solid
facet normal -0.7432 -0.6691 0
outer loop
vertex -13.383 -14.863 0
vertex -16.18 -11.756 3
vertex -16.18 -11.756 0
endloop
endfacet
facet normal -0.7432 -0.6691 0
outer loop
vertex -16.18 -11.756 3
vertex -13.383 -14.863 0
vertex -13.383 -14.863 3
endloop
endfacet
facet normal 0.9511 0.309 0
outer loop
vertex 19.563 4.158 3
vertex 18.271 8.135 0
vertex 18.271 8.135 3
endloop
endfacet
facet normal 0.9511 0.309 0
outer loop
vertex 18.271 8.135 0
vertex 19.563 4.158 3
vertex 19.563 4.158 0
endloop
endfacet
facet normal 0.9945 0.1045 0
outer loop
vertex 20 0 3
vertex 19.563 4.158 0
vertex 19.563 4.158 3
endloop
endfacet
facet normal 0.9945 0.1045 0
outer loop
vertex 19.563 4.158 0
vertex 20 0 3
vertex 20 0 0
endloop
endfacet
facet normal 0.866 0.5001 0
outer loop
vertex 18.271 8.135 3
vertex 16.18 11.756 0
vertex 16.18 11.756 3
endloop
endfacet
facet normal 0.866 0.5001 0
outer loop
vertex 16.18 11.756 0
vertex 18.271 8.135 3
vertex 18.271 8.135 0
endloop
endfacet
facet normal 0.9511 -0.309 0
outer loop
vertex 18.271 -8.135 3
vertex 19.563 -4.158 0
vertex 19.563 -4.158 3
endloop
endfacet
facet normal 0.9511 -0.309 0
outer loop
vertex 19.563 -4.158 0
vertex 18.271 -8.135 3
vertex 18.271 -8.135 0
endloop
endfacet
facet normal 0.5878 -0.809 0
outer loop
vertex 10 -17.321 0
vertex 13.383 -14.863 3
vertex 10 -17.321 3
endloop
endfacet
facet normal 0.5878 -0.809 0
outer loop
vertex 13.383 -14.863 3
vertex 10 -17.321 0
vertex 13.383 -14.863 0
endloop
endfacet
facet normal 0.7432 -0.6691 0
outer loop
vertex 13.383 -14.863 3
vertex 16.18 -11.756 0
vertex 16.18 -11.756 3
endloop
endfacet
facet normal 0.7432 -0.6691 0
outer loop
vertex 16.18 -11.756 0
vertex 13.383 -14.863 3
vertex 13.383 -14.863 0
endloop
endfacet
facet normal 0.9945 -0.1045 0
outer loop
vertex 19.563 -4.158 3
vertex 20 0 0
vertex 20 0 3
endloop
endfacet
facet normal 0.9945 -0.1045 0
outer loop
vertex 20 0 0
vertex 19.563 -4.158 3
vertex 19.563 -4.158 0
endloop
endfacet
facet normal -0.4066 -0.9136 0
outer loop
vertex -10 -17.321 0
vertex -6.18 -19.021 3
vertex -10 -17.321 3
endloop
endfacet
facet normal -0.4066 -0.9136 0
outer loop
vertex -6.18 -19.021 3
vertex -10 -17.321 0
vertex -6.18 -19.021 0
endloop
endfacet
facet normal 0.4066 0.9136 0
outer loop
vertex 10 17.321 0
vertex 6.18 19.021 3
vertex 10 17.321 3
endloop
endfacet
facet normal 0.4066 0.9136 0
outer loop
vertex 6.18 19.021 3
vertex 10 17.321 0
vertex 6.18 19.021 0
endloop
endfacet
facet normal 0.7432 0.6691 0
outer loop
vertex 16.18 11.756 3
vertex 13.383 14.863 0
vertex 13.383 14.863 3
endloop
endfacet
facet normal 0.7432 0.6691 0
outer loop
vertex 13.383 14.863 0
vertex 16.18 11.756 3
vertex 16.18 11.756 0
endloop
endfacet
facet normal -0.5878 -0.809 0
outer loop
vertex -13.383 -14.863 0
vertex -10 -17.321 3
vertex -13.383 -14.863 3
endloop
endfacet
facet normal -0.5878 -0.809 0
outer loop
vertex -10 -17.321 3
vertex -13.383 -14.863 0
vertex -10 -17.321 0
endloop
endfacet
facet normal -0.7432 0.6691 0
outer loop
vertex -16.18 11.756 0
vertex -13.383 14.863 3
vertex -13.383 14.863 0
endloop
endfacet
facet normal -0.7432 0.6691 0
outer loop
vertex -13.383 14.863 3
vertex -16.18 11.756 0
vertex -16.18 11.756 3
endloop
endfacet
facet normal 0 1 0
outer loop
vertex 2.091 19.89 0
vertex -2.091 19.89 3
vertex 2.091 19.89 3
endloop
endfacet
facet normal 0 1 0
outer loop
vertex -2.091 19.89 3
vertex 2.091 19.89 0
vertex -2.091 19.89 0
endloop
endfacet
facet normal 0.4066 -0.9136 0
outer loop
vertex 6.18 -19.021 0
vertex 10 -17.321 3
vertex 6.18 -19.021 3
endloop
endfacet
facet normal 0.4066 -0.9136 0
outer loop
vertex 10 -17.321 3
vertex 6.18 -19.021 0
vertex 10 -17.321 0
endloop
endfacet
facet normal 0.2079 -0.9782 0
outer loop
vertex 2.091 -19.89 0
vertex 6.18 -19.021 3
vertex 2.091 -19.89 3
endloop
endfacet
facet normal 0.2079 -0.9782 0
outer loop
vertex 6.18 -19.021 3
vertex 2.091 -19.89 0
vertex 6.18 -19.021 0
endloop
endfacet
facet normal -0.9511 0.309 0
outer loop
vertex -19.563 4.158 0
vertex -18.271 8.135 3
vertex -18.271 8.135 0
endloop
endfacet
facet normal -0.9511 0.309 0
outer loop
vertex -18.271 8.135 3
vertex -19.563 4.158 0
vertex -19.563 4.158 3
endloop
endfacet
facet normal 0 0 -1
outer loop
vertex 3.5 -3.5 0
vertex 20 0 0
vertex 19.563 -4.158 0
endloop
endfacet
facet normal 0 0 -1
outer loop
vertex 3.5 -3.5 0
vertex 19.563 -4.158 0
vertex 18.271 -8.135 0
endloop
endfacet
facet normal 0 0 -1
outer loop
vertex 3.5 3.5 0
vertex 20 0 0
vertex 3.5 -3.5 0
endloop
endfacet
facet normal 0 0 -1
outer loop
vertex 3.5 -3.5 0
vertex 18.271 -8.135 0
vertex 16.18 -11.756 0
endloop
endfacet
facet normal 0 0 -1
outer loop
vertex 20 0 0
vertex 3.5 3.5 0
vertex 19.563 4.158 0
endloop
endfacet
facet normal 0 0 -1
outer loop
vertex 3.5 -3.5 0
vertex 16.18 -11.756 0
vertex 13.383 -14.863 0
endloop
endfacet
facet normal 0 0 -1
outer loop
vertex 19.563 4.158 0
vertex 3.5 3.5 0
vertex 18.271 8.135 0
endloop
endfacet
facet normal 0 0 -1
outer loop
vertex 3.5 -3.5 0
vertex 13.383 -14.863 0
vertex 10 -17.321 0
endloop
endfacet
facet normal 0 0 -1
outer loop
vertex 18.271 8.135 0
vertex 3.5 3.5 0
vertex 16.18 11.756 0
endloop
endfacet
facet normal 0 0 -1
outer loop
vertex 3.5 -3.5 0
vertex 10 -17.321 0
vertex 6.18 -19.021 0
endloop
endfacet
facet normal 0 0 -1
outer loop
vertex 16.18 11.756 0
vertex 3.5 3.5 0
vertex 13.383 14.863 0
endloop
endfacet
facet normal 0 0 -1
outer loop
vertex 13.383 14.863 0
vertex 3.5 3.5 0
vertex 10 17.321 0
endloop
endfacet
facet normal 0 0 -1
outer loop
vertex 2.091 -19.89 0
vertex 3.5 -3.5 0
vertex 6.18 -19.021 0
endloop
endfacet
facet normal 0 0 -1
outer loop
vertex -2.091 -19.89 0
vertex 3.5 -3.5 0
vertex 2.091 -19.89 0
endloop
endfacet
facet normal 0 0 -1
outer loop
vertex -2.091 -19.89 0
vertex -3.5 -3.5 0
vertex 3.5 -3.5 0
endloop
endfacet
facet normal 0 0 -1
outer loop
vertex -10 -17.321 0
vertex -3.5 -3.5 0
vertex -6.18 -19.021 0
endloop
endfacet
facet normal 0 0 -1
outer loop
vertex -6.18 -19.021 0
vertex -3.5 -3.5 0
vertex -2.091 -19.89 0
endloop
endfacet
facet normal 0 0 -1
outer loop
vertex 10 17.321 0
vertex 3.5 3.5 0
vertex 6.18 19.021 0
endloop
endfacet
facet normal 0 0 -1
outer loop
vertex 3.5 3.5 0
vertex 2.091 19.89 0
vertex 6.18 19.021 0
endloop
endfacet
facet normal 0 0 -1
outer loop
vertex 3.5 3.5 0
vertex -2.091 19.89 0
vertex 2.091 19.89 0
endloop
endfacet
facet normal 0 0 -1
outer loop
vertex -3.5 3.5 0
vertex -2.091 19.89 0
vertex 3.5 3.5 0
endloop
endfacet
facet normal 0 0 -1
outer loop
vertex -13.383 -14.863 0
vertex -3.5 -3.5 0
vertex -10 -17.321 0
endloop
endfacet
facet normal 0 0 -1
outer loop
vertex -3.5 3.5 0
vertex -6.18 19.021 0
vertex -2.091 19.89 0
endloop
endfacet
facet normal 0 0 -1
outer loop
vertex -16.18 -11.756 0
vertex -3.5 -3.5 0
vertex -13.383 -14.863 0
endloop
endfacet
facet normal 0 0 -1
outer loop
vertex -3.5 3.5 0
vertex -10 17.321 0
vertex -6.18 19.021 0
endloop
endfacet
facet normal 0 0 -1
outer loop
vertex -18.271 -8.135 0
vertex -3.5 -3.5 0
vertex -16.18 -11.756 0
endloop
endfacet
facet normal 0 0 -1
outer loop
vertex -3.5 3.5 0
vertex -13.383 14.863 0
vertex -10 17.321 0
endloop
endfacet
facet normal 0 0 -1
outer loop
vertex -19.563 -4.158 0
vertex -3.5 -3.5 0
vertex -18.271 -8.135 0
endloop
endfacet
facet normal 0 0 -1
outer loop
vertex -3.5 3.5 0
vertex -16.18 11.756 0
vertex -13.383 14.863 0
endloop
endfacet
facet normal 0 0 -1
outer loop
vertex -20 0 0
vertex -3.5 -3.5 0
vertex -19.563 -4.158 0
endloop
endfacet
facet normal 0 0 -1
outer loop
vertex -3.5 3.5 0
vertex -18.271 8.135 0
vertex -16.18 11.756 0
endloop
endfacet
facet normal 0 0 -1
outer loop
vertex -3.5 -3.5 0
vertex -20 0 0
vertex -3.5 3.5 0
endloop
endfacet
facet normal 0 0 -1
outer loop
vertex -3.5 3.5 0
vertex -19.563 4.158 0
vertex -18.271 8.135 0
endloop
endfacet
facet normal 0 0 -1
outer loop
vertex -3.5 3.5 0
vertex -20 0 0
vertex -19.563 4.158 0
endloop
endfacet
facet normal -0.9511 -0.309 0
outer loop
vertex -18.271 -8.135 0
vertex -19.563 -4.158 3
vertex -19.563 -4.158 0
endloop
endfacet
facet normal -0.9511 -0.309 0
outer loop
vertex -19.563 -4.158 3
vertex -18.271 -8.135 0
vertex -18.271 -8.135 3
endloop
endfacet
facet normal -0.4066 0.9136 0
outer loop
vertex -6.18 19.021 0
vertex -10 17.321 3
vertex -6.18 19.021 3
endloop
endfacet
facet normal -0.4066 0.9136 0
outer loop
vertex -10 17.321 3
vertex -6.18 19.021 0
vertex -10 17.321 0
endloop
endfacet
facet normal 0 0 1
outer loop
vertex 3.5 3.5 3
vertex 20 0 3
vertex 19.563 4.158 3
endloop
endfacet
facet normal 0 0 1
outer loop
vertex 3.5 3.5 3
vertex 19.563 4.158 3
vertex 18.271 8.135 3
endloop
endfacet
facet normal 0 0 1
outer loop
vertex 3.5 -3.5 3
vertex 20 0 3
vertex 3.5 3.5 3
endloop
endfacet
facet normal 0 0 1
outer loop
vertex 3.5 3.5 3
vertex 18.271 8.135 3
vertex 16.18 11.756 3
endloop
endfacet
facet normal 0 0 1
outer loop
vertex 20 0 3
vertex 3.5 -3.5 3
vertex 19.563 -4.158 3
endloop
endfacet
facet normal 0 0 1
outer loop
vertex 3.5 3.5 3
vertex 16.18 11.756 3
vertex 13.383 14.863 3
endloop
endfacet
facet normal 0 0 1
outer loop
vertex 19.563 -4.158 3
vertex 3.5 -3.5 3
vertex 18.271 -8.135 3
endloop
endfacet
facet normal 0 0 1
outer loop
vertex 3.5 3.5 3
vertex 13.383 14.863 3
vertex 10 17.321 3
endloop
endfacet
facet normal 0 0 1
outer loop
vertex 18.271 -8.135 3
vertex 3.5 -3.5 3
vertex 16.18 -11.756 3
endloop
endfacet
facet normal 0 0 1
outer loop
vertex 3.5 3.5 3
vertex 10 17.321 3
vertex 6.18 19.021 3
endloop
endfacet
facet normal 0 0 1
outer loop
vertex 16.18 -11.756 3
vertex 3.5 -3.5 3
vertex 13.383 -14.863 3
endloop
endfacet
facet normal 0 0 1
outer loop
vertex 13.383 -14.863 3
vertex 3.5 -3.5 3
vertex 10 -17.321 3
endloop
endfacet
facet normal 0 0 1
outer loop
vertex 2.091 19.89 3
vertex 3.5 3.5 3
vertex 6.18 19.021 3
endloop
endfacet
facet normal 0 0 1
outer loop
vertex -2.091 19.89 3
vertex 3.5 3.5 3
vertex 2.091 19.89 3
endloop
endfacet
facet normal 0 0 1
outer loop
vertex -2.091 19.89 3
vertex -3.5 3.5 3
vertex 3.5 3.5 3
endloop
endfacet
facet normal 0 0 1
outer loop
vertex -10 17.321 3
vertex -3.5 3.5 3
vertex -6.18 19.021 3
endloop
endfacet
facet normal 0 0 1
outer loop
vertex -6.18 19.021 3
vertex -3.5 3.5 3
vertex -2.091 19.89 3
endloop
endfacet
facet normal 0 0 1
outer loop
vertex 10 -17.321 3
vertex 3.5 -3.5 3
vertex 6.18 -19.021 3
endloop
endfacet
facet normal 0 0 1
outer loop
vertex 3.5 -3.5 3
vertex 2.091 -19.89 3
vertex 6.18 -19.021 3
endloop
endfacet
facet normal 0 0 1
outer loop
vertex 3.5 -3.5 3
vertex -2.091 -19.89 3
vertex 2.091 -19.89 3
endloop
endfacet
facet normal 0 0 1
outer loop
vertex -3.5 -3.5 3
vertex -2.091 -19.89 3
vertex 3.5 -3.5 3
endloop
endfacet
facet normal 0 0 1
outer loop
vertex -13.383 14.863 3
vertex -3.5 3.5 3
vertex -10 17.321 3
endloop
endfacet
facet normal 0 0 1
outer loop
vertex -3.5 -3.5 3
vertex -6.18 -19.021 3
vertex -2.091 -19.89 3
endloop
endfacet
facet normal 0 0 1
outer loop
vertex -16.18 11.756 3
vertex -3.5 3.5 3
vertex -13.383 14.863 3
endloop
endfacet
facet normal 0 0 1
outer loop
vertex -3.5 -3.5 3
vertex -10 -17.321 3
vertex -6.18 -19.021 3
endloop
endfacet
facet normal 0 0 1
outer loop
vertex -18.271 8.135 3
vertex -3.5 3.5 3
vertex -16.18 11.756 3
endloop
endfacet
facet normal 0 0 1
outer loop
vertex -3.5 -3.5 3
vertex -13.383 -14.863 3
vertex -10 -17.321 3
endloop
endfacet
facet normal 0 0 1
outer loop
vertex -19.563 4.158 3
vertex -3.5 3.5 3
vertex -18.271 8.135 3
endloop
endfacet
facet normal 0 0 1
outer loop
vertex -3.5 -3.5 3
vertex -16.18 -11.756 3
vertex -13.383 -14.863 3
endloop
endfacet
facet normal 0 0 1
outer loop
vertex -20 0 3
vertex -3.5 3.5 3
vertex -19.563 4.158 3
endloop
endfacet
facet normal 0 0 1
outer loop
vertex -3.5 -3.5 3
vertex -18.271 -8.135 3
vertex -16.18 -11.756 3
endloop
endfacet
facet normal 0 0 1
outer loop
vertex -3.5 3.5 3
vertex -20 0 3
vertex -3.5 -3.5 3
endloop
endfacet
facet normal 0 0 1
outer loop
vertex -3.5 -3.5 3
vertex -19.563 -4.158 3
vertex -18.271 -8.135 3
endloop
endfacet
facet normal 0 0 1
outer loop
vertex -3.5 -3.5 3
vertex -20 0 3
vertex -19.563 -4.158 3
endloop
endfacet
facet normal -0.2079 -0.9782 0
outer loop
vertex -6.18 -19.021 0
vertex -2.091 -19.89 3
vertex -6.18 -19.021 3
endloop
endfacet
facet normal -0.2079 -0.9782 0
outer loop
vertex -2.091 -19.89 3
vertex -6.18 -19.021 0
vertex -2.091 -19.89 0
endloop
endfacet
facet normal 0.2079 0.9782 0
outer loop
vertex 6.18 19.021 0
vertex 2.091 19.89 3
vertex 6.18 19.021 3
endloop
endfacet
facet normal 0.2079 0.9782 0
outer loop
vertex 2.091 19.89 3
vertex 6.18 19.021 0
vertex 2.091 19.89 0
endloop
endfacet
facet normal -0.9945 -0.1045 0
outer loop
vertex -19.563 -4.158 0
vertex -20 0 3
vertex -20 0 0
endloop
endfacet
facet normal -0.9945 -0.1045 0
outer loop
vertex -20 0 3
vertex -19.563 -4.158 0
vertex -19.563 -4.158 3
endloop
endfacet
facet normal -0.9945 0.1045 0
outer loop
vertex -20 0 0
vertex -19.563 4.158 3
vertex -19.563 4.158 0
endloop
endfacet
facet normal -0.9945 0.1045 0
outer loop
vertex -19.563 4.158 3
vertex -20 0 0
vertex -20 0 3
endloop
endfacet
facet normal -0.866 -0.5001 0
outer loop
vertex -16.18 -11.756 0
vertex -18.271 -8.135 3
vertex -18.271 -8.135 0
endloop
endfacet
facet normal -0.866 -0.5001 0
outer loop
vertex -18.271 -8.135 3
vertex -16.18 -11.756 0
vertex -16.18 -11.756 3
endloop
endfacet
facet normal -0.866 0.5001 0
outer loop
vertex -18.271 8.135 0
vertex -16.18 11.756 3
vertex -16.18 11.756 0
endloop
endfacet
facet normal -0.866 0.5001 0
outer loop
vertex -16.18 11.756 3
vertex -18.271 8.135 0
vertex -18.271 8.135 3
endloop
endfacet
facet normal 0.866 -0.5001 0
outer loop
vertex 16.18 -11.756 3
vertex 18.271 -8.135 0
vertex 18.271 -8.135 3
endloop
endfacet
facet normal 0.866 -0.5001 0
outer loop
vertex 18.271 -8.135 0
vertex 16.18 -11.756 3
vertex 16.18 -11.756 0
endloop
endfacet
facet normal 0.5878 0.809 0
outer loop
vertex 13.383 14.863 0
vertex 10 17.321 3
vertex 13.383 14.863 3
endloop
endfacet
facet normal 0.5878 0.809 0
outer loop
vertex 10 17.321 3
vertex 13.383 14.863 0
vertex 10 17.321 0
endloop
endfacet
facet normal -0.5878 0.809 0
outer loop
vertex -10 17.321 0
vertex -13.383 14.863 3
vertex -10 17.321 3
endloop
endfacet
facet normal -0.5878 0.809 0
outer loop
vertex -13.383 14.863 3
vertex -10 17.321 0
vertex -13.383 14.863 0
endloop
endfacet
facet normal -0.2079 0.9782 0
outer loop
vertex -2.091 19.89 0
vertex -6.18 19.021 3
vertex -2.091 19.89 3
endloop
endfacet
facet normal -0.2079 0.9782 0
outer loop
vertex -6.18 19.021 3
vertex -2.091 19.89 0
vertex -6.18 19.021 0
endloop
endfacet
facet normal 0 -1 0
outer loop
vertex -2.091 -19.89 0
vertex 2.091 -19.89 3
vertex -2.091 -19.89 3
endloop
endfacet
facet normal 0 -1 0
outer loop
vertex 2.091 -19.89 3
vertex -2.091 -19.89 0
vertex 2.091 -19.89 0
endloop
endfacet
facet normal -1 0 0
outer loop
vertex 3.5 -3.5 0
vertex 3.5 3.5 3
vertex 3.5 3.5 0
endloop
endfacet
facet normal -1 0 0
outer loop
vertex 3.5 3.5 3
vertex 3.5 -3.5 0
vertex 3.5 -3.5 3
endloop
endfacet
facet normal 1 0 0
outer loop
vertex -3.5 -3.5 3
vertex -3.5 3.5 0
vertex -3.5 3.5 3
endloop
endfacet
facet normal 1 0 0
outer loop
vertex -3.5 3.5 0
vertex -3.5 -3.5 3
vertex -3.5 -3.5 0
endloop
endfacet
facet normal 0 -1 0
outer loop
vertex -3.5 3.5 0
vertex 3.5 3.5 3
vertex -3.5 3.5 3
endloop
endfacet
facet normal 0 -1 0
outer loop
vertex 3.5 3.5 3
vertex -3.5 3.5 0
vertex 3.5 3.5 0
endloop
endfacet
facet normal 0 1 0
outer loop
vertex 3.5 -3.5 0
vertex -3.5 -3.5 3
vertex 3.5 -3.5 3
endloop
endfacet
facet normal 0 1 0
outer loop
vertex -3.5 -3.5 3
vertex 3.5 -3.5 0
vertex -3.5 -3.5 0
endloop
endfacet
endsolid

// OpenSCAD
difference()
{
    cylinder(h = 3,
             r = 20);

    translate([0,0,-0.1])
    cube (center=true,
          size = [7, 7, 7]);
}
